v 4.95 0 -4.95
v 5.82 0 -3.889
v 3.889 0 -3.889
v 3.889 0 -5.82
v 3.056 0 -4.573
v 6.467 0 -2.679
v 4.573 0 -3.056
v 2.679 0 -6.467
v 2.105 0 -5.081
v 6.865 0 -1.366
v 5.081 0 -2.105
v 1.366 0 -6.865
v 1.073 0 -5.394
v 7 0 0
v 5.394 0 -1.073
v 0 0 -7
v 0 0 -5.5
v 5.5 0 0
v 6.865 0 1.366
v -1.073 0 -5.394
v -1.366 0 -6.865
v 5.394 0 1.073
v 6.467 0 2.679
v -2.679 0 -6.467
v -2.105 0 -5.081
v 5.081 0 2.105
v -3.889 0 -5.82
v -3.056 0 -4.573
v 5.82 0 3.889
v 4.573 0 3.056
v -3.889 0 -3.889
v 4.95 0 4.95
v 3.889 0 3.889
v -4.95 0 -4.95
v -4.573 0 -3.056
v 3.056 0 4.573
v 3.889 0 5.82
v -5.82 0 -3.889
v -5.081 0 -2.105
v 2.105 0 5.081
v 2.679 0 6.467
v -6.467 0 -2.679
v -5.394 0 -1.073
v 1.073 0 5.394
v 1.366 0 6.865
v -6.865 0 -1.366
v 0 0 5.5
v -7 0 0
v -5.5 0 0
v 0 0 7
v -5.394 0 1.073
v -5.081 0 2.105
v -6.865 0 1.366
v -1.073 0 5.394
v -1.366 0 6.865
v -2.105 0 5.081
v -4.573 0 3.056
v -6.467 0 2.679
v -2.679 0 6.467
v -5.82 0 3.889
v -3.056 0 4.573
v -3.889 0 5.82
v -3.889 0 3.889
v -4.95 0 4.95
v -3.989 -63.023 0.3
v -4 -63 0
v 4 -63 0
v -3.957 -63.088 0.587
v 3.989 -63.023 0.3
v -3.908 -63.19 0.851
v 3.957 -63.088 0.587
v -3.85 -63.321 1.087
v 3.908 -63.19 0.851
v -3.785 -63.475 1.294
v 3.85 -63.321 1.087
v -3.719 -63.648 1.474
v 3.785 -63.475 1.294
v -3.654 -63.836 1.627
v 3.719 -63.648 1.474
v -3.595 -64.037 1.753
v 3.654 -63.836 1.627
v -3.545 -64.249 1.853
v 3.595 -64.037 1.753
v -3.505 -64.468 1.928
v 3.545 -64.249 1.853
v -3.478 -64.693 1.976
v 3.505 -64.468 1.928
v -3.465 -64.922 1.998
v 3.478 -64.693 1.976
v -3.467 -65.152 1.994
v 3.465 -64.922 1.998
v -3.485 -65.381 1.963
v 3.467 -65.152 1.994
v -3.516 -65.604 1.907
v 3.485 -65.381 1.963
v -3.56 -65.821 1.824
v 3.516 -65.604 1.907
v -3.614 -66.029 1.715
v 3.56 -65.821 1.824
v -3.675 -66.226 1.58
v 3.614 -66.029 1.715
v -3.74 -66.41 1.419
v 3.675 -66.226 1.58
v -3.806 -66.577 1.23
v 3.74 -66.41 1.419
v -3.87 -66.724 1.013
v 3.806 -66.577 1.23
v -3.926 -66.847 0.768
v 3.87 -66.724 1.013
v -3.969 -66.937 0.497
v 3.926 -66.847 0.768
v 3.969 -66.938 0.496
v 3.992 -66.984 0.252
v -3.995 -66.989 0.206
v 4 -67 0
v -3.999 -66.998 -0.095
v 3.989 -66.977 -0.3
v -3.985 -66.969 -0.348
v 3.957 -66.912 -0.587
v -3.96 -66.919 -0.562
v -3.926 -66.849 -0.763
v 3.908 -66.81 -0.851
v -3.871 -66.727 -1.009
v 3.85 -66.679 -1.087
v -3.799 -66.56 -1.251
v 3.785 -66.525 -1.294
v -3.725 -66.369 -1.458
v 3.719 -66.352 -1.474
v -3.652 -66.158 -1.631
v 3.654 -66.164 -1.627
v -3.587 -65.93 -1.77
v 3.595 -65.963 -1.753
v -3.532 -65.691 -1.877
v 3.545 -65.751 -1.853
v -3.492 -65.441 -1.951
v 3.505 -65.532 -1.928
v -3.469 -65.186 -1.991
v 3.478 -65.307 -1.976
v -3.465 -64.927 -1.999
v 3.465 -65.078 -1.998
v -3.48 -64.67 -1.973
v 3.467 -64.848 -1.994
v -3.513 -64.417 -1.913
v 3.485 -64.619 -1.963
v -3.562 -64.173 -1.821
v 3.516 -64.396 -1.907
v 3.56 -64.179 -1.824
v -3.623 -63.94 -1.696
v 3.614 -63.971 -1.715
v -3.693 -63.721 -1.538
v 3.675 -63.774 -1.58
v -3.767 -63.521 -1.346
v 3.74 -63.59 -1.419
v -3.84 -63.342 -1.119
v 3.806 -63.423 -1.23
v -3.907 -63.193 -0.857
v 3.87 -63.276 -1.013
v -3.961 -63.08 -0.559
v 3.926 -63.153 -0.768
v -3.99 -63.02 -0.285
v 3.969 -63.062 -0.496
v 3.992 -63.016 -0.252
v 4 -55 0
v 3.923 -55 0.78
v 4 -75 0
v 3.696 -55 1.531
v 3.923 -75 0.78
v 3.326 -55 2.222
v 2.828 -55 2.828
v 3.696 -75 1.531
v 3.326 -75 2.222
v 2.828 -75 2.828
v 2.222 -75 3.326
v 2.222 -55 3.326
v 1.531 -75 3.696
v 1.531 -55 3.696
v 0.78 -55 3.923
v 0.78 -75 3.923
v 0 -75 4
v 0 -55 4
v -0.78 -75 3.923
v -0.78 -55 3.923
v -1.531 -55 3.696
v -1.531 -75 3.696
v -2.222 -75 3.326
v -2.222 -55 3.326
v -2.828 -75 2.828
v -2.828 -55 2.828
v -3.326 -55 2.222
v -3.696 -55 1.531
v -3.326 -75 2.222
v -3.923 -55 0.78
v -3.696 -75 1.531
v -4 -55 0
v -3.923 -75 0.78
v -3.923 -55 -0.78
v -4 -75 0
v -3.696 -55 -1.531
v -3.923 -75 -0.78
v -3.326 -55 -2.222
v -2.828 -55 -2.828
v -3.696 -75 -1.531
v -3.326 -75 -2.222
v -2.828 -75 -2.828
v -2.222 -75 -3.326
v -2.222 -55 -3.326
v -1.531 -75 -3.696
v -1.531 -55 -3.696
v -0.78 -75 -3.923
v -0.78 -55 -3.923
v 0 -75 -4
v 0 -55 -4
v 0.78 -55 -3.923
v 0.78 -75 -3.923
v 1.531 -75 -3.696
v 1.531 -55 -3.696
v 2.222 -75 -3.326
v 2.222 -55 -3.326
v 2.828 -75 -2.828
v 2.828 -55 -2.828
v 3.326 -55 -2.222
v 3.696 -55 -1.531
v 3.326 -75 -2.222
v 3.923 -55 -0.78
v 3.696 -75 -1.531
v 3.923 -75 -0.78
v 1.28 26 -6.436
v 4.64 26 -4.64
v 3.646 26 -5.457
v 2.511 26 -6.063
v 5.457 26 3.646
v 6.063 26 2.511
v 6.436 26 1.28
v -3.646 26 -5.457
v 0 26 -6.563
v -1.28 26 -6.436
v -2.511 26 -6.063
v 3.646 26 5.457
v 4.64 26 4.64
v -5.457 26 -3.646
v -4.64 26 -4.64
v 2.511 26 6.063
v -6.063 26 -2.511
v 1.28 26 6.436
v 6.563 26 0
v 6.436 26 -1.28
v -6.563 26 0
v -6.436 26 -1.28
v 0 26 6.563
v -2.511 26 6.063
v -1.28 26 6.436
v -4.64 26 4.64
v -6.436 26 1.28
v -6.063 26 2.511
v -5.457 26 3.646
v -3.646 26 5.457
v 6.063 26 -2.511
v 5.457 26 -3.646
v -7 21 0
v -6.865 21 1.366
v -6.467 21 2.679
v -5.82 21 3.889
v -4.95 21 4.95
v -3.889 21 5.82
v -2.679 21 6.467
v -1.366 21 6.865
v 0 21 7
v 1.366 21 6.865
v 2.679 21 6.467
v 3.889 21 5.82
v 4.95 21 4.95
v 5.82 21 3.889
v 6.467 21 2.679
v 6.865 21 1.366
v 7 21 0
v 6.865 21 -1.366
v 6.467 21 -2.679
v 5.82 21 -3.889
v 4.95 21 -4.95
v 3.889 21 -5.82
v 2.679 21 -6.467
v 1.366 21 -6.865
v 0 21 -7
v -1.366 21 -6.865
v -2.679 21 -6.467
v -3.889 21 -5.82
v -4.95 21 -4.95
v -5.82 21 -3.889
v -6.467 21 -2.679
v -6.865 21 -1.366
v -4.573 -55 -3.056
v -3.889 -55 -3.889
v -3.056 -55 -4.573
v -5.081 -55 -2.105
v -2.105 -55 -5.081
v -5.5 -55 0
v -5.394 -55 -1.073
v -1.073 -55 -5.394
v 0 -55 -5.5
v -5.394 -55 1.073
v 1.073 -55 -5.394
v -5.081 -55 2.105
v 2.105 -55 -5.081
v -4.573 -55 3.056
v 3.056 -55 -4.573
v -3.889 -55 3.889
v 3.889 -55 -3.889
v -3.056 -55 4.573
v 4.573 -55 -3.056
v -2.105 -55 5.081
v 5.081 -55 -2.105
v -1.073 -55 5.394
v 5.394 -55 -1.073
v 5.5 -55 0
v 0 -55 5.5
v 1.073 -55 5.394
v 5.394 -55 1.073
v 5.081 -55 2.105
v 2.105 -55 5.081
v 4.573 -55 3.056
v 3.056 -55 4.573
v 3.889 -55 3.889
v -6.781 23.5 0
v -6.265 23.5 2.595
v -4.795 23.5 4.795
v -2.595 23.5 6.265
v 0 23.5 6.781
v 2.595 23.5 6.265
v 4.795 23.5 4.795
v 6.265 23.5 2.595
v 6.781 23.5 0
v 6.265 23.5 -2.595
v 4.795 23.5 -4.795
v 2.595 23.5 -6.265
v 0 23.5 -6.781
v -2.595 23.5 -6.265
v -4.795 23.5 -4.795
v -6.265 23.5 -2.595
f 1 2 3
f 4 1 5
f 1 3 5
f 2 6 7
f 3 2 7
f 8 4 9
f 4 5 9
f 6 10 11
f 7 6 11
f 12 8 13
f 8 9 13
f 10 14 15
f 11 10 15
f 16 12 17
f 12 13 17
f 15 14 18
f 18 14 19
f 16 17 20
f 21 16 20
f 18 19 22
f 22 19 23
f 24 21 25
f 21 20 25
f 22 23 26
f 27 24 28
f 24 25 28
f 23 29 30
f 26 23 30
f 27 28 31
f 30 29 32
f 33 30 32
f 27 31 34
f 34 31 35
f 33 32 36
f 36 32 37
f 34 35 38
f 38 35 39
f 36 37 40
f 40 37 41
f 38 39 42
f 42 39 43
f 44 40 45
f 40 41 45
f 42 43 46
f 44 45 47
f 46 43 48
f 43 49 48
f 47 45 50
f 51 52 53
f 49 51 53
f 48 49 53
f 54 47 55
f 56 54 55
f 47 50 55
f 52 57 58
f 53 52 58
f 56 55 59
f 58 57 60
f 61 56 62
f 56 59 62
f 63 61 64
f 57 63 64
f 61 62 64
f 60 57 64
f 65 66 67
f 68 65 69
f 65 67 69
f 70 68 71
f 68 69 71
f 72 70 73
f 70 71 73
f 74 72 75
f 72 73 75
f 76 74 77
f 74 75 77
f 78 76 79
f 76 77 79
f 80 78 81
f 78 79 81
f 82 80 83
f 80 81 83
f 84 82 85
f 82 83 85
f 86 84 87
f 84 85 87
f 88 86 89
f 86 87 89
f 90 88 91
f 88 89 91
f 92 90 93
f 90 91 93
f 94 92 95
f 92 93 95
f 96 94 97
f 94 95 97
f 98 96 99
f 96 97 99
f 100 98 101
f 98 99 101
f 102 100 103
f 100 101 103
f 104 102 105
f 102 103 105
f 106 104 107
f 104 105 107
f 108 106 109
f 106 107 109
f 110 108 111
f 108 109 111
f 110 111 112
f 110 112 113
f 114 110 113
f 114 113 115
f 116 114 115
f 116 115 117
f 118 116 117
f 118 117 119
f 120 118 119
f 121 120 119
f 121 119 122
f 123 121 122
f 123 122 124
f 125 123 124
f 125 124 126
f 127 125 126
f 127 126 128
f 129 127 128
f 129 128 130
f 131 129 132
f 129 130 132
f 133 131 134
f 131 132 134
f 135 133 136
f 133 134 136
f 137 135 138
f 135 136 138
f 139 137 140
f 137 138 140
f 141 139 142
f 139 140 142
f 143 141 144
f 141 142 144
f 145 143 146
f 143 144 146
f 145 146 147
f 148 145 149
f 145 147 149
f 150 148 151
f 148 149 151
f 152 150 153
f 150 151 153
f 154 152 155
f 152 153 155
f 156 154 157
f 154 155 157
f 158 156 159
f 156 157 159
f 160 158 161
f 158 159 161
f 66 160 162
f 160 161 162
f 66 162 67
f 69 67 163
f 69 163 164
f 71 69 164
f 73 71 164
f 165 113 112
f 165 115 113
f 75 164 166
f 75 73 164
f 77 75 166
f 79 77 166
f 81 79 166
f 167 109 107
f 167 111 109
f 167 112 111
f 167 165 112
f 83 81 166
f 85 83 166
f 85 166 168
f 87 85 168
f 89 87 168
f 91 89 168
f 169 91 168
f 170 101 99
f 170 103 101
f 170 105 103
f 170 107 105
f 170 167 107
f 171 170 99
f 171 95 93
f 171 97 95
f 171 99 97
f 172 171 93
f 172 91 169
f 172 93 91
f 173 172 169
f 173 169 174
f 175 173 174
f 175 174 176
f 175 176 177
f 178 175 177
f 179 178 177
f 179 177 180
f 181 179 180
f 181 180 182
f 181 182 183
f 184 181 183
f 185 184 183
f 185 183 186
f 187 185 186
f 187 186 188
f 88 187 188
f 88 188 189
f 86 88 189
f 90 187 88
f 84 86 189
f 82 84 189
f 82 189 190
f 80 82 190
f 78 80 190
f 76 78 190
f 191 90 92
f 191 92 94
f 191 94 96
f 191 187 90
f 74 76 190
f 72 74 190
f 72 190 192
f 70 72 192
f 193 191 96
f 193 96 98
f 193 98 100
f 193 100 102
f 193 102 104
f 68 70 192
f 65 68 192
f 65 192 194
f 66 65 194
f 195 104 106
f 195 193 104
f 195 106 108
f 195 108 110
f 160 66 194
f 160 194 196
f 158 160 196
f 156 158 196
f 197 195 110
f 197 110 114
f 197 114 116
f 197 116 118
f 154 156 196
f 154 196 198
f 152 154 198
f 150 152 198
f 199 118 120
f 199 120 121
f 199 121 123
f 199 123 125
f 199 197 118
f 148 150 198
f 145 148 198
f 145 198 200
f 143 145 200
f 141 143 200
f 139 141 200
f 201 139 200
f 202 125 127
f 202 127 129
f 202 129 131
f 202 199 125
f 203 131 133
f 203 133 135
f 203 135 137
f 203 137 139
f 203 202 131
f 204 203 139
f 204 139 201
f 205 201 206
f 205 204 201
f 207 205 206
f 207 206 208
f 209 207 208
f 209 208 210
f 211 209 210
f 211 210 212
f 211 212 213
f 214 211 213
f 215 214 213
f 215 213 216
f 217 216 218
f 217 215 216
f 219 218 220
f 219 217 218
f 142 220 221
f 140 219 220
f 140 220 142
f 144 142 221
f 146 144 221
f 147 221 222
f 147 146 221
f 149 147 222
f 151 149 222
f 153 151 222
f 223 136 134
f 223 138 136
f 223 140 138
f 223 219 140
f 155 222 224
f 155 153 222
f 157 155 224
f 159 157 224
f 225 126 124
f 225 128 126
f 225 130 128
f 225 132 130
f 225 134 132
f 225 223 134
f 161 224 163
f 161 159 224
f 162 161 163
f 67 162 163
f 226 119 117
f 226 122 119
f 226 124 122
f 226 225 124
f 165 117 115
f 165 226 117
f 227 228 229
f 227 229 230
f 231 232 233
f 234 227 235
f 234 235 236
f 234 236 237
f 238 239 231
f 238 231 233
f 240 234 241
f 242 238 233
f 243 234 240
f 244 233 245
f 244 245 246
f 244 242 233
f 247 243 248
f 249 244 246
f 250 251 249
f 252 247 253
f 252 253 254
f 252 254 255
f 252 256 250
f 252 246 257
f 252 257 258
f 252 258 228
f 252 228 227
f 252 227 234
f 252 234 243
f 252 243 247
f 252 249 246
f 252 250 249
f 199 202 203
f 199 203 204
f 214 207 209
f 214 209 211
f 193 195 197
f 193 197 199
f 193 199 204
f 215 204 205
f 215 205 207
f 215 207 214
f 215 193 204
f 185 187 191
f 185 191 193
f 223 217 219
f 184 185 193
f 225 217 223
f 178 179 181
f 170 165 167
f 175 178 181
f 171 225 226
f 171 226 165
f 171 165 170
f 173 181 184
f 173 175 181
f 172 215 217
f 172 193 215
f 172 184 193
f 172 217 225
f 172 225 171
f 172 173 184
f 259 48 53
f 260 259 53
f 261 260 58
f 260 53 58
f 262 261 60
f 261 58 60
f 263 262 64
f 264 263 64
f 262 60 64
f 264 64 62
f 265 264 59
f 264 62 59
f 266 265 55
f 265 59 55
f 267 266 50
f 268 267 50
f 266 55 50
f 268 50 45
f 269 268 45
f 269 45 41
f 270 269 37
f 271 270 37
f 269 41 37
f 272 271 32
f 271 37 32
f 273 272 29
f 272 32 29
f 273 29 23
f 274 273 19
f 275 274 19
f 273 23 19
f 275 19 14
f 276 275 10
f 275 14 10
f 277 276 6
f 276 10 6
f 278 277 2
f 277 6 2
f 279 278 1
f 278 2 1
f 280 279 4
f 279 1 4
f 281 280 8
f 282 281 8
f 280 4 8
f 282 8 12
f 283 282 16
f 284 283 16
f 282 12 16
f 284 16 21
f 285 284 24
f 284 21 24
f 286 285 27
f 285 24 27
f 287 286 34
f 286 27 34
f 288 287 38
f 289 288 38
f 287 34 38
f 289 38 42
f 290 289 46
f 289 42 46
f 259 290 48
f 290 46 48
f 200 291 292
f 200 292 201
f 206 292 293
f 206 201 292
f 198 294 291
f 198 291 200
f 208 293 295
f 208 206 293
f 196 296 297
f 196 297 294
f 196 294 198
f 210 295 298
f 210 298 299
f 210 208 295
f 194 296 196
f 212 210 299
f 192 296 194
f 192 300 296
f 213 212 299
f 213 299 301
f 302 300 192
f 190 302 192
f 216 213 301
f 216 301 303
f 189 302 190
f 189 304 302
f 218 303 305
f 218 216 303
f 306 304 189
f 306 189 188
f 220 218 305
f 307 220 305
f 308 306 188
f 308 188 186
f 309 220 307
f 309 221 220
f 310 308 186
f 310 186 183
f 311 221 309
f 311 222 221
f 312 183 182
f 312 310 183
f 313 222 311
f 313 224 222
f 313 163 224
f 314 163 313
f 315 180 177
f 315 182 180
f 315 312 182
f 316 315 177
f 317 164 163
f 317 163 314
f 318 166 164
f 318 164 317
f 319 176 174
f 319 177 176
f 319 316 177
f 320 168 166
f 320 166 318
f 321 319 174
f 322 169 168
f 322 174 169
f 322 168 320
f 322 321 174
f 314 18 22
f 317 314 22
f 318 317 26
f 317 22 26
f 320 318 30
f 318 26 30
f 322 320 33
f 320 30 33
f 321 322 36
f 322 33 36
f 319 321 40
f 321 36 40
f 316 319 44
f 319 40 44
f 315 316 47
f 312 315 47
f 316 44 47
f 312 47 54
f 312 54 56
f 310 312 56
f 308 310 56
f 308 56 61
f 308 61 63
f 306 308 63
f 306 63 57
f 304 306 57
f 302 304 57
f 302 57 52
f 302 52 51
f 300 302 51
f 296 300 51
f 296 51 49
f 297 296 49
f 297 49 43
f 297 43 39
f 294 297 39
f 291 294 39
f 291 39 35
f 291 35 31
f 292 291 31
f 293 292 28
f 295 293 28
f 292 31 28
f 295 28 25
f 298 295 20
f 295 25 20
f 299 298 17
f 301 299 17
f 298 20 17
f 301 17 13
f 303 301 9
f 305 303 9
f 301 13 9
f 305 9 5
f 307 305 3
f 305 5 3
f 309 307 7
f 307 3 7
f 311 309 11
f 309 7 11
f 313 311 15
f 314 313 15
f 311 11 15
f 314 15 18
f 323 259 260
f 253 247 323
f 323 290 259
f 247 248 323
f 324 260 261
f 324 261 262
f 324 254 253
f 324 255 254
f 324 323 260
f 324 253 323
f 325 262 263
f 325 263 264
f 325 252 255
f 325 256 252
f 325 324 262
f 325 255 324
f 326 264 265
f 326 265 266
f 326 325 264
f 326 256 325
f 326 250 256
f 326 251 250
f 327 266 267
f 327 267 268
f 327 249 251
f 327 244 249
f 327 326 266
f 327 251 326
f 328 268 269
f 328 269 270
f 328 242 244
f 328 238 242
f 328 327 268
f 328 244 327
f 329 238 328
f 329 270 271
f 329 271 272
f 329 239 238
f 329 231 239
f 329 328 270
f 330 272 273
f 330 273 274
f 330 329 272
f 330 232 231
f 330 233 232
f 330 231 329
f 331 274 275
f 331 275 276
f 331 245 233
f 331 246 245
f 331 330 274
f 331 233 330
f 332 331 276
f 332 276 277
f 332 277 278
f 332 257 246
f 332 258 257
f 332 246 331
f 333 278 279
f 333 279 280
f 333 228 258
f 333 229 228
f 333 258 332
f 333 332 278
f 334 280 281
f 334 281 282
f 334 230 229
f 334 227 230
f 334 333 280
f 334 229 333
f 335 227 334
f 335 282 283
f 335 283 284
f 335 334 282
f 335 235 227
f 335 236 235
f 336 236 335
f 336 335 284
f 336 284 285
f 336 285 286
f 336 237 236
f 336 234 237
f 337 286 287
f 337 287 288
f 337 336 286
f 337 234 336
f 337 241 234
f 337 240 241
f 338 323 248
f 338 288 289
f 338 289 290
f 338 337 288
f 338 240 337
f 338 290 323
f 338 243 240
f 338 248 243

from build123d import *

# Parameters (mm, degrees)
F0_R     = 5.5
F1_DEPTH = 75
F2_R     = 7
F3_DEPTH = 26
F4_SIZE2 = 0.437443
F4_SIZE  = 5
F5_R     = 5.5
F5_R_2   = 4
F6_DEPTH = 20
F7_R     = 2
F8_DEPTH = 12.5


with BuildPart() as f1:
    # F0 (on Front) → F1 (new body)
    with BuildSketch(Plane.XZ):
        Circle(F0_R)
    extrude(amount=F1_DEPTH)

    # F2 (on face) → F3 (join)
    with BuildSketch(Plane(origin=(0, 0, 0), x_dir=(-1, 0, 0), z_dir=(0, 1, 0))):
        Circle(F2_R)
    extrude(amount=F3_DEPTH)

    # F4
    f4_edges = [f1.edges().sort_by_distance(p)[0] for p in [
        (7, 26, 0),
    ]]
    chamfer(f4_edges, length=F4_SIZE, length2=F4_SIZE2)

    # F5 (on face) → F6 (cut)
    with BuildSketch(Plane.XZ.offset(75)):
        Circle(F5_R)
        Circle(F5_R_2, mode=Mode.SUBTRACT)
    extrude(amount=-F6_DEPTH, mode=Mode.SUBTRACT)

    # F7 (on Right) → F8 (cut, symmetric)
    with BuildSketch(Plane.YZ):
        with Locations((-65, 0)):
            Circle(F7_R)
    extrude(amount=F8_DEPTH, both=True, mode=Mode.SUBTRACT)


solid = f1.part
